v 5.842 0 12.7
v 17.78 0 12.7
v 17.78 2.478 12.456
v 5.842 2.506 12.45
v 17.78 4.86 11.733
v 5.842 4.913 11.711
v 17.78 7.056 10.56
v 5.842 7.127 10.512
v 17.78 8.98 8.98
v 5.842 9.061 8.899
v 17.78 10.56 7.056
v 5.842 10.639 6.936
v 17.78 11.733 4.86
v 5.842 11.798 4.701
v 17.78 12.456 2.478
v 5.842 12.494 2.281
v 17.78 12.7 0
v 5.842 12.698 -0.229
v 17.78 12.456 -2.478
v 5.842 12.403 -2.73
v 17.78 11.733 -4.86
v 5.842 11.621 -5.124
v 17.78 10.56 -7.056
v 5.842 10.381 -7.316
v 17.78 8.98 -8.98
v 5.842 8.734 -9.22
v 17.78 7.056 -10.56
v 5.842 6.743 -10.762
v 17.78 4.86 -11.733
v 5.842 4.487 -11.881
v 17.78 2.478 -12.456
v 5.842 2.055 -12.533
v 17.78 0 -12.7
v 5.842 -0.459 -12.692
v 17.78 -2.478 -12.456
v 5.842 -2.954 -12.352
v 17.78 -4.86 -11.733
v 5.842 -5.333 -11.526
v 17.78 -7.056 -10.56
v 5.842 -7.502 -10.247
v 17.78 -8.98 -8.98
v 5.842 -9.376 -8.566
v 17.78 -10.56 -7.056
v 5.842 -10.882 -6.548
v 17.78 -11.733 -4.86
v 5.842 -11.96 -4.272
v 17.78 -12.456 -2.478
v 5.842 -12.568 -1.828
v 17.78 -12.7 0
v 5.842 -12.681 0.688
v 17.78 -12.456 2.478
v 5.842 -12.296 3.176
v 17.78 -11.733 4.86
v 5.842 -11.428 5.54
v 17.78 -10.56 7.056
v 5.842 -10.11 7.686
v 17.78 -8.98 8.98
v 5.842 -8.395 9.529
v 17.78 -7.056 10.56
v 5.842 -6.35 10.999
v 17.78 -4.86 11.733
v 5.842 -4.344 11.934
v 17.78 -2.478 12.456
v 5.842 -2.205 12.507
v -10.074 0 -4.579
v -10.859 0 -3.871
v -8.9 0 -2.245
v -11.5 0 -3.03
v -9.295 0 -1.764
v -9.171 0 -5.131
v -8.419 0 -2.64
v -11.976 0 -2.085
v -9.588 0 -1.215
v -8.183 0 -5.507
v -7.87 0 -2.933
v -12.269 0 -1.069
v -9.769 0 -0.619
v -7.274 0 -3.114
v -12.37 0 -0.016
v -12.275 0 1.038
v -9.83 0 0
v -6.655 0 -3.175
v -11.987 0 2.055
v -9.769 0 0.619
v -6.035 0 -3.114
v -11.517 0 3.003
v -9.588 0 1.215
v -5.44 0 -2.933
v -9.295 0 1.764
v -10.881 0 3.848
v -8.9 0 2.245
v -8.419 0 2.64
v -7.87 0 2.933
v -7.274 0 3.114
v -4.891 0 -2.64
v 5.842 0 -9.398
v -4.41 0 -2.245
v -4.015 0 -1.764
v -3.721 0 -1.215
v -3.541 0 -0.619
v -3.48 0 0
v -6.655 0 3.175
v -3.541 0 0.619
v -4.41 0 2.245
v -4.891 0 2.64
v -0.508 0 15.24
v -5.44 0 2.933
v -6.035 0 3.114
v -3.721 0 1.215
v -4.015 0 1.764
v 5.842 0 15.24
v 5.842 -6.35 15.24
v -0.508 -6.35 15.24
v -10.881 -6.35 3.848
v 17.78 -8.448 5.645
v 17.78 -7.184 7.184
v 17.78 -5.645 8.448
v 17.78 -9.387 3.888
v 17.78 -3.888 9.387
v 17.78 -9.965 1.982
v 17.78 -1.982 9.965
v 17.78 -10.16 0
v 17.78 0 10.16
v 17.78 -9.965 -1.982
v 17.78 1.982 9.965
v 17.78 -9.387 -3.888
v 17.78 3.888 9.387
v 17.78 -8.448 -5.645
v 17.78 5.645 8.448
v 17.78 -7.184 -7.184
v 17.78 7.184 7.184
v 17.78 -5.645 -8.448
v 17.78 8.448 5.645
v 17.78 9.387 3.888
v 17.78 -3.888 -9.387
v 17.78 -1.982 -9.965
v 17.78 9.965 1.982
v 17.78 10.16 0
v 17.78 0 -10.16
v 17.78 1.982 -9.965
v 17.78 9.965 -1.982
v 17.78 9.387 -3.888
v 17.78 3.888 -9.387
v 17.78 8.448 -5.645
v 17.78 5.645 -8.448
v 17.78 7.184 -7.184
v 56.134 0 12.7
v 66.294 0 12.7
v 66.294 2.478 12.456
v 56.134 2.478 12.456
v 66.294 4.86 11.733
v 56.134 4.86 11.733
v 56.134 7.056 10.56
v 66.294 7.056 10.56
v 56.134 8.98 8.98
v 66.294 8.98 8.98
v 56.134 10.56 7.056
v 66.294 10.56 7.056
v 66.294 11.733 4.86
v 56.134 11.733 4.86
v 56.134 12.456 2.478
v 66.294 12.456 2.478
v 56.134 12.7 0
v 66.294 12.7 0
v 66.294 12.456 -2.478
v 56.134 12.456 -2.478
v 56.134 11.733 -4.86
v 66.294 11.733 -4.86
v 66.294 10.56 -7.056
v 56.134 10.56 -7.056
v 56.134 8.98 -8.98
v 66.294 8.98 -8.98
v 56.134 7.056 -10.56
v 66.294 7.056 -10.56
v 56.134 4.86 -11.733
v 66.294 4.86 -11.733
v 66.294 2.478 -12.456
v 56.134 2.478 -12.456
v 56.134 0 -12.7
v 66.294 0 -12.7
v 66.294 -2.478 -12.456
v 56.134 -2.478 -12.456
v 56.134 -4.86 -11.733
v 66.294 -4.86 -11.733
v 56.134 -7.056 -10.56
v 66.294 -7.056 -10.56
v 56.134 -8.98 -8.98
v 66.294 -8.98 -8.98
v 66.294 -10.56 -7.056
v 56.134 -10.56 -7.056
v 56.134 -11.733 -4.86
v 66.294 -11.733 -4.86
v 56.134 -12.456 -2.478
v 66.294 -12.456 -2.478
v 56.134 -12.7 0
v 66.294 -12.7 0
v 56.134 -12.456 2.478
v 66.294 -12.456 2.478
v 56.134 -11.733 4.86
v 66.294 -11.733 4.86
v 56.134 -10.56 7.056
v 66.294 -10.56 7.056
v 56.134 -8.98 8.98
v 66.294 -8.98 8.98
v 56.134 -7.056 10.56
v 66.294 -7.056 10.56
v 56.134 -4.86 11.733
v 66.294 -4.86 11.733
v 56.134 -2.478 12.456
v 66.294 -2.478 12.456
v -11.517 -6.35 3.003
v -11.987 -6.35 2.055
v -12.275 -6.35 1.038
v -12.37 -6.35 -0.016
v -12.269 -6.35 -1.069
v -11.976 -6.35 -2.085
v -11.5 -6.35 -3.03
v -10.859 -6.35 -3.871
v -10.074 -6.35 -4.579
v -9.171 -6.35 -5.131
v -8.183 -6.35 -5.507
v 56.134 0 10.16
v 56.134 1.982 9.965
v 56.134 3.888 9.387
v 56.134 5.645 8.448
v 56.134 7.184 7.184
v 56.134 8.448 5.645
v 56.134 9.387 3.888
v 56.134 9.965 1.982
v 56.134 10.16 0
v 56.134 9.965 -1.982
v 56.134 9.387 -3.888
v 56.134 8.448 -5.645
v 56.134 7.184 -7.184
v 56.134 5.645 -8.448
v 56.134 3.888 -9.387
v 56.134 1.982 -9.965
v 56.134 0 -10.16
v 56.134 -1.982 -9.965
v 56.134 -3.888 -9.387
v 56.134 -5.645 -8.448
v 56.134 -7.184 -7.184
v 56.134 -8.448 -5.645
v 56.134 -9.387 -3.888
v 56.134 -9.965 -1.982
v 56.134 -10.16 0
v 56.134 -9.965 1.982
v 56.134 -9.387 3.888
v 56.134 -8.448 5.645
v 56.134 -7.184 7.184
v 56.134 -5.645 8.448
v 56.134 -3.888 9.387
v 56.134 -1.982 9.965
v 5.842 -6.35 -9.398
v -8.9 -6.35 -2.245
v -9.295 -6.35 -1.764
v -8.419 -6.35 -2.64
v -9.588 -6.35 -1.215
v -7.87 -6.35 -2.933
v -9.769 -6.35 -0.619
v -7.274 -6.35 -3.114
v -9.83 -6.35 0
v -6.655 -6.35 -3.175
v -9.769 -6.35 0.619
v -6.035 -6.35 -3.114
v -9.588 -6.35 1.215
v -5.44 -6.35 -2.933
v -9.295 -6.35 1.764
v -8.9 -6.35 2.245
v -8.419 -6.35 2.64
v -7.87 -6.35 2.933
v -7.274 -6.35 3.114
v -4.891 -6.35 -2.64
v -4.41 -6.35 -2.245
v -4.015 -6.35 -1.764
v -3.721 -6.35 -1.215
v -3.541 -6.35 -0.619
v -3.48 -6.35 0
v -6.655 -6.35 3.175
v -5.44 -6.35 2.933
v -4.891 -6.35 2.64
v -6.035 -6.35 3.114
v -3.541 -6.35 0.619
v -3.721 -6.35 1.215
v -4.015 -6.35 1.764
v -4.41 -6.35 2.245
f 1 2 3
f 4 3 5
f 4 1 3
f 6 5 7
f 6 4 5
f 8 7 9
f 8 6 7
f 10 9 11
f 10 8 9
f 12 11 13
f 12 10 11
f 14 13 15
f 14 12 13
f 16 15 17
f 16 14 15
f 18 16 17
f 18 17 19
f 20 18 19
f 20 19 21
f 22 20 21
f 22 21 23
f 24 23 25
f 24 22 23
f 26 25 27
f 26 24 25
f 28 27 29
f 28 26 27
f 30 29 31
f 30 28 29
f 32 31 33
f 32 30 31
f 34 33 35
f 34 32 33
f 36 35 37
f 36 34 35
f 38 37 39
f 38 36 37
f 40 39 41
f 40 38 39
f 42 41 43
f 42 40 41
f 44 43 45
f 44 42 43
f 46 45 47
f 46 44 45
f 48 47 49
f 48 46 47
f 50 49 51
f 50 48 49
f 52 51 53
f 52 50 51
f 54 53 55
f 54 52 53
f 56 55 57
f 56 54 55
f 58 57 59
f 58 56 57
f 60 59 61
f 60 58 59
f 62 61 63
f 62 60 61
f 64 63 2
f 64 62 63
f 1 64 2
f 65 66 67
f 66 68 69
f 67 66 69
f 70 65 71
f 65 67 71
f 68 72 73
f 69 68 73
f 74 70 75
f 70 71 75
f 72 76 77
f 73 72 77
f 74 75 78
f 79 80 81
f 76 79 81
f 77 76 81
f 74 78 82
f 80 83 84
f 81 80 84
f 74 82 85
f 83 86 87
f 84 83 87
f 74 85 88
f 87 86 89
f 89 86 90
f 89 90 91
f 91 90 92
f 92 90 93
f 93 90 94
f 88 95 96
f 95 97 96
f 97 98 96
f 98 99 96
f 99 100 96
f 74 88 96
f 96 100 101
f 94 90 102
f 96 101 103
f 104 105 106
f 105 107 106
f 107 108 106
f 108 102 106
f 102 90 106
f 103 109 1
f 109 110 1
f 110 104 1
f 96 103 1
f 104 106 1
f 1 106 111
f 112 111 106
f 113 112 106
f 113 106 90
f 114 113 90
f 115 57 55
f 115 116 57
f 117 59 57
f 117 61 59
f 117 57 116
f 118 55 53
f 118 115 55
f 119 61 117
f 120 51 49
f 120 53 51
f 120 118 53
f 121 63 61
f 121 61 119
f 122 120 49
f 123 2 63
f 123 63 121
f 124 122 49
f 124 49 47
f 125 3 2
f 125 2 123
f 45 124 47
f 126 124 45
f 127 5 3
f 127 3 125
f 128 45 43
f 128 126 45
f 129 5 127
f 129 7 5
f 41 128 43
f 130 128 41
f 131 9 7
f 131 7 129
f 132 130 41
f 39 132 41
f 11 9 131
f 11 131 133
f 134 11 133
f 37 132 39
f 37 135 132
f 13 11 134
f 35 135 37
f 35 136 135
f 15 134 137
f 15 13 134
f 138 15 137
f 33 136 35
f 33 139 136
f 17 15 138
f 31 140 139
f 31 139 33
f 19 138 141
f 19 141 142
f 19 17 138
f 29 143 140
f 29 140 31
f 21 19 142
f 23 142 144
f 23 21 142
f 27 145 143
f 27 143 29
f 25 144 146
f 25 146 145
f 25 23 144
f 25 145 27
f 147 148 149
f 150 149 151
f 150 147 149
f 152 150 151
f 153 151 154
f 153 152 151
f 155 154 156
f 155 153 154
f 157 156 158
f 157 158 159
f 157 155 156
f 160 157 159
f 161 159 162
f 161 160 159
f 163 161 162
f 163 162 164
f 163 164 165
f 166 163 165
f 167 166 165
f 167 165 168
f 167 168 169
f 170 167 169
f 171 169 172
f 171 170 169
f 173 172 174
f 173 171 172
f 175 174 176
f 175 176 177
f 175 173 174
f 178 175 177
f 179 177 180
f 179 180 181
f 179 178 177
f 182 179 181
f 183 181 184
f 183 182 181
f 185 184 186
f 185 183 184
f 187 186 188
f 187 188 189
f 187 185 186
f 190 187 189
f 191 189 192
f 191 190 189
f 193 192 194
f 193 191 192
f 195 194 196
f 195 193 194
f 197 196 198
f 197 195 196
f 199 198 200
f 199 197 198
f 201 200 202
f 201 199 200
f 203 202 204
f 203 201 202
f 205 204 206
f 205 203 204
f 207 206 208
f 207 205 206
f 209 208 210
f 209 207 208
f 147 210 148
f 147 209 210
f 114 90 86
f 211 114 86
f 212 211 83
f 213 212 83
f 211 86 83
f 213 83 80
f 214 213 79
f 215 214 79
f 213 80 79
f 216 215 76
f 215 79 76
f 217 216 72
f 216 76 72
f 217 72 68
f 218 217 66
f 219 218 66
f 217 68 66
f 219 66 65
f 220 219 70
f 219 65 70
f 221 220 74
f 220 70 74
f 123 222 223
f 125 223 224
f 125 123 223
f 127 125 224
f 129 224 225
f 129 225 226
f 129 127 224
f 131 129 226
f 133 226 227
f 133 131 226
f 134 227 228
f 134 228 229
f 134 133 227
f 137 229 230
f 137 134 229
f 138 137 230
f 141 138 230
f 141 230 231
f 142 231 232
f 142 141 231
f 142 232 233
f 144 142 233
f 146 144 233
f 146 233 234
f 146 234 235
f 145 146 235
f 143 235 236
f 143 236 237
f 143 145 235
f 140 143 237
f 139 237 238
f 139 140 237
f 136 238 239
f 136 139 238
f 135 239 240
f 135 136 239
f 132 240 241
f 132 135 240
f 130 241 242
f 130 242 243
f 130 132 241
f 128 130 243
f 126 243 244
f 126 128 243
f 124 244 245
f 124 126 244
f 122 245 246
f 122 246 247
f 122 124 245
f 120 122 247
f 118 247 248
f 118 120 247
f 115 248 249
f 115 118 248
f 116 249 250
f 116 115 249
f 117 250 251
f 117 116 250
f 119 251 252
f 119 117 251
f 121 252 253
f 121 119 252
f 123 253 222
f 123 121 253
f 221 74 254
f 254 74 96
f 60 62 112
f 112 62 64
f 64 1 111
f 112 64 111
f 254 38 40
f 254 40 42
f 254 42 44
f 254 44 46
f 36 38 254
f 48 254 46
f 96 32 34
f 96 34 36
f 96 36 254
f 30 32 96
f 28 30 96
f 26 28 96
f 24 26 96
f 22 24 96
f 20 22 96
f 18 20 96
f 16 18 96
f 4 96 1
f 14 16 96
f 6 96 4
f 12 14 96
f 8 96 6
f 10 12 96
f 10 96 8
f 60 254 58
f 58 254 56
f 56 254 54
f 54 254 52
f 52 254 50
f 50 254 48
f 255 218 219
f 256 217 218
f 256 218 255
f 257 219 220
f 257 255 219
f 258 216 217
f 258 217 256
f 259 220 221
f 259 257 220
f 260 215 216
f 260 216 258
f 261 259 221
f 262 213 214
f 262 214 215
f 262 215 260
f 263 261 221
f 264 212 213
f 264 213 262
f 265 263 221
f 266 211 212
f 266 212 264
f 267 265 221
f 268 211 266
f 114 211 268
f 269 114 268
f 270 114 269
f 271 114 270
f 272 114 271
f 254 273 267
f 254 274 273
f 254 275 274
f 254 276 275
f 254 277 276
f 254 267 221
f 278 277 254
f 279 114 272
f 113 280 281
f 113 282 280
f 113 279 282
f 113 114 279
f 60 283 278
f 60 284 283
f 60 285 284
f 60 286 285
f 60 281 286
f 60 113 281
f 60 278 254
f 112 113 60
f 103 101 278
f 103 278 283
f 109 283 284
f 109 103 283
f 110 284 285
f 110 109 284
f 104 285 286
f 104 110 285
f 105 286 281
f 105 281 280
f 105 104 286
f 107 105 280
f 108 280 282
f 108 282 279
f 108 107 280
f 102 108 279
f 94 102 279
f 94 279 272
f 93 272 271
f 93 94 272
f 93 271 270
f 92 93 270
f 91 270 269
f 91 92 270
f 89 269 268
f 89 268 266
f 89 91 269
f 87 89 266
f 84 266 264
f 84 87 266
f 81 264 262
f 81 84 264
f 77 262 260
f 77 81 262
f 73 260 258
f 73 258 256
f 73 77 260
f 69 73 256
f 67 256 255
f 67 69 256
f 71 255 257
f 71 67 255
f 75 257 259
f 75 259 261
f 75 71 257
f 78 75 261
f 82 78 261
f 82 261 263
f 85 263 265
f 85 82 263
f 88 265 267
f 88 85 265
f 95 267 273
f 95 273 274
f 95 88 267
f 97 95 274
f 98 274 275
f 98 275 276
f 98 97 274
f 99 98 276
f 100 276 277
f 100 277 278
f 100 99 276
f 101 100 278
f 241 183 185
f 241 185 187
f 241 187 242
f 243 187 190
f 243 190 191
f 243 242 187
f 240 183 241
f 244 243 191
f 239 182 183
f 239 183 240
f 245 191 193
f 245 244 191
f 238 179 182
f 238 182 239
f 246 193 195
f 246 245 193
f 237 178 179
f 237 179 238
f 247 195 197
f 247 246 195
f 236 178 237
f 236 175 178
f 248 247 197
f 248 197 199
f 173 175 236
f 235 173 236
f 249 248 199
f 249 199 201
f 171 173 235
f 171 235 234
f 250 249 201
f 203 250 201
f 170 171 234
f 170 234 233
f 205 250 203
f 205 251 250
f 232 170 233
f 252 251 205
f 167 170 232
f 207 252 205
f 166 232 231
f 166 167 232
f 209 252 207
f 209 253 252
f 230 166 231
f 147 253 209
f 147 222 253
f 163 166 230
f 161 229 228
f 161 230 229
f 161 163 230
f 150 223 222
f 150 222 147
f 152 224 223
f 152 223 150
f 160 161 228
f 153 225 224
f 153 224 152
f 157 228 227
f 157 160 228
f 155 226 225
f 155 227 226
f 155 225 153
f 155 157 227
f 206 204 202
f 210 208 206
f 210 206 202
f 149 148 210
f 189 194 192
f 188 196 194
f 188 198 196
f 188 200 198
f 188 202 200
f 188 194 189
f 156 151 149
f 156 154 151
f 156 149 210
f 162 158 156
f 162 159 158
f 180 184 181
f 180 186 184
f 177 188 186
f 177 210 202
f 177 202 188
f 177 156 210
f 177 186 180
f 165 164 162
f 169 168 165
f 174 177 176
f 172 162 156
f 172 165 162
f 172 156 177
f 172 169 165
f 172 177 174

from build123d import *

# Parameters (mm, degrees)
F0_R     = 3.175
F0_W     = 5.842
F0_H     = 12.7
F2_DEPTH = 6.35
F3_DEPTH = 7.62


with BuildPart() as f1:
    # F0 (on Front) → F1 (revolve)
    with BuildSketch(Plane.XZ):
        Polygon((5.842, 12.7), (5.842, 0), (66.294, 0), (66.294, 12.7), (56.134, 12.7), (56.134, 10.16), (10.16, 10.16), (10.16, 12.7), align=None)
    revolve(axis=Axis((33.147, 0, 0), (-1, 0, 0)))

    # F0 (on Front) → F2 (join)
    with BuildSketch(Plane.XZ):
        with BuildLine():
            ThreePointArc((-8.1826630726, -5.5069827884), (-3.1957909266, -4.5493385486), (-0.9398, 0))
            ThreePointArc((-0.9398, 0), (-4.5919612295, 5.3297205562), (-10.8806298187, 3.8475430269))
            ThreePointArc((-10.8806298187, 3.8475430269), (-12.1459778134, -1.5837270034), (-8.1826630726, -5.5069827884))
        make_face()
        with Locations((-6.6548, 0)):
            Circle(F0_R, mode=Mode.SUBTRACT)
        with BuildLine():
            Line((5.842, 0), (0, 0))
            Line((0, 0), (-0.9398, 0))
            ThreePointArc((-0.9398, 0), (-3.1957909266, -4.5493385486), (-8.1826630726, -5.5069827884))
            Line((-8.1826630726, -5.5069827884), (5.842, -9.398))
            Line((5.842, -9.398), (5.842, 0))
        make_face()
        with BuildLine():
            Line((-0.9398, 0), (0, 0))
            Line((0, 0), (0, 12.7))
            Line((0, 12.7), (5.842, 12.7))
            Line((5.842, 12.7), (5.842, 15.24))
            Line((5.842, 15.24), (-0.508, 15.24))
            Line((-0.508, 15.24), (-10.8806298187, 3.8475430269))
            ThreePointArc((-10.8806298187, 3.8475430269), (-4.5919612295, 5.3297205562), (-0.9398, 0))
        make_face()
        with Locations((2.921, 6.35)):
            Rectangle(F0_W, F0_H)
    extrude(amount=F2_DEPTH)

    # F3 (add): a face of the model
    f3_faces = [f1.faces().sort_by_distance(p)[0] for p in [
        (10.16, 0, -10.5192102448),
    ]]
    extrude(f3_faces, amount=F3_DEPTH)


solid = f1.part
